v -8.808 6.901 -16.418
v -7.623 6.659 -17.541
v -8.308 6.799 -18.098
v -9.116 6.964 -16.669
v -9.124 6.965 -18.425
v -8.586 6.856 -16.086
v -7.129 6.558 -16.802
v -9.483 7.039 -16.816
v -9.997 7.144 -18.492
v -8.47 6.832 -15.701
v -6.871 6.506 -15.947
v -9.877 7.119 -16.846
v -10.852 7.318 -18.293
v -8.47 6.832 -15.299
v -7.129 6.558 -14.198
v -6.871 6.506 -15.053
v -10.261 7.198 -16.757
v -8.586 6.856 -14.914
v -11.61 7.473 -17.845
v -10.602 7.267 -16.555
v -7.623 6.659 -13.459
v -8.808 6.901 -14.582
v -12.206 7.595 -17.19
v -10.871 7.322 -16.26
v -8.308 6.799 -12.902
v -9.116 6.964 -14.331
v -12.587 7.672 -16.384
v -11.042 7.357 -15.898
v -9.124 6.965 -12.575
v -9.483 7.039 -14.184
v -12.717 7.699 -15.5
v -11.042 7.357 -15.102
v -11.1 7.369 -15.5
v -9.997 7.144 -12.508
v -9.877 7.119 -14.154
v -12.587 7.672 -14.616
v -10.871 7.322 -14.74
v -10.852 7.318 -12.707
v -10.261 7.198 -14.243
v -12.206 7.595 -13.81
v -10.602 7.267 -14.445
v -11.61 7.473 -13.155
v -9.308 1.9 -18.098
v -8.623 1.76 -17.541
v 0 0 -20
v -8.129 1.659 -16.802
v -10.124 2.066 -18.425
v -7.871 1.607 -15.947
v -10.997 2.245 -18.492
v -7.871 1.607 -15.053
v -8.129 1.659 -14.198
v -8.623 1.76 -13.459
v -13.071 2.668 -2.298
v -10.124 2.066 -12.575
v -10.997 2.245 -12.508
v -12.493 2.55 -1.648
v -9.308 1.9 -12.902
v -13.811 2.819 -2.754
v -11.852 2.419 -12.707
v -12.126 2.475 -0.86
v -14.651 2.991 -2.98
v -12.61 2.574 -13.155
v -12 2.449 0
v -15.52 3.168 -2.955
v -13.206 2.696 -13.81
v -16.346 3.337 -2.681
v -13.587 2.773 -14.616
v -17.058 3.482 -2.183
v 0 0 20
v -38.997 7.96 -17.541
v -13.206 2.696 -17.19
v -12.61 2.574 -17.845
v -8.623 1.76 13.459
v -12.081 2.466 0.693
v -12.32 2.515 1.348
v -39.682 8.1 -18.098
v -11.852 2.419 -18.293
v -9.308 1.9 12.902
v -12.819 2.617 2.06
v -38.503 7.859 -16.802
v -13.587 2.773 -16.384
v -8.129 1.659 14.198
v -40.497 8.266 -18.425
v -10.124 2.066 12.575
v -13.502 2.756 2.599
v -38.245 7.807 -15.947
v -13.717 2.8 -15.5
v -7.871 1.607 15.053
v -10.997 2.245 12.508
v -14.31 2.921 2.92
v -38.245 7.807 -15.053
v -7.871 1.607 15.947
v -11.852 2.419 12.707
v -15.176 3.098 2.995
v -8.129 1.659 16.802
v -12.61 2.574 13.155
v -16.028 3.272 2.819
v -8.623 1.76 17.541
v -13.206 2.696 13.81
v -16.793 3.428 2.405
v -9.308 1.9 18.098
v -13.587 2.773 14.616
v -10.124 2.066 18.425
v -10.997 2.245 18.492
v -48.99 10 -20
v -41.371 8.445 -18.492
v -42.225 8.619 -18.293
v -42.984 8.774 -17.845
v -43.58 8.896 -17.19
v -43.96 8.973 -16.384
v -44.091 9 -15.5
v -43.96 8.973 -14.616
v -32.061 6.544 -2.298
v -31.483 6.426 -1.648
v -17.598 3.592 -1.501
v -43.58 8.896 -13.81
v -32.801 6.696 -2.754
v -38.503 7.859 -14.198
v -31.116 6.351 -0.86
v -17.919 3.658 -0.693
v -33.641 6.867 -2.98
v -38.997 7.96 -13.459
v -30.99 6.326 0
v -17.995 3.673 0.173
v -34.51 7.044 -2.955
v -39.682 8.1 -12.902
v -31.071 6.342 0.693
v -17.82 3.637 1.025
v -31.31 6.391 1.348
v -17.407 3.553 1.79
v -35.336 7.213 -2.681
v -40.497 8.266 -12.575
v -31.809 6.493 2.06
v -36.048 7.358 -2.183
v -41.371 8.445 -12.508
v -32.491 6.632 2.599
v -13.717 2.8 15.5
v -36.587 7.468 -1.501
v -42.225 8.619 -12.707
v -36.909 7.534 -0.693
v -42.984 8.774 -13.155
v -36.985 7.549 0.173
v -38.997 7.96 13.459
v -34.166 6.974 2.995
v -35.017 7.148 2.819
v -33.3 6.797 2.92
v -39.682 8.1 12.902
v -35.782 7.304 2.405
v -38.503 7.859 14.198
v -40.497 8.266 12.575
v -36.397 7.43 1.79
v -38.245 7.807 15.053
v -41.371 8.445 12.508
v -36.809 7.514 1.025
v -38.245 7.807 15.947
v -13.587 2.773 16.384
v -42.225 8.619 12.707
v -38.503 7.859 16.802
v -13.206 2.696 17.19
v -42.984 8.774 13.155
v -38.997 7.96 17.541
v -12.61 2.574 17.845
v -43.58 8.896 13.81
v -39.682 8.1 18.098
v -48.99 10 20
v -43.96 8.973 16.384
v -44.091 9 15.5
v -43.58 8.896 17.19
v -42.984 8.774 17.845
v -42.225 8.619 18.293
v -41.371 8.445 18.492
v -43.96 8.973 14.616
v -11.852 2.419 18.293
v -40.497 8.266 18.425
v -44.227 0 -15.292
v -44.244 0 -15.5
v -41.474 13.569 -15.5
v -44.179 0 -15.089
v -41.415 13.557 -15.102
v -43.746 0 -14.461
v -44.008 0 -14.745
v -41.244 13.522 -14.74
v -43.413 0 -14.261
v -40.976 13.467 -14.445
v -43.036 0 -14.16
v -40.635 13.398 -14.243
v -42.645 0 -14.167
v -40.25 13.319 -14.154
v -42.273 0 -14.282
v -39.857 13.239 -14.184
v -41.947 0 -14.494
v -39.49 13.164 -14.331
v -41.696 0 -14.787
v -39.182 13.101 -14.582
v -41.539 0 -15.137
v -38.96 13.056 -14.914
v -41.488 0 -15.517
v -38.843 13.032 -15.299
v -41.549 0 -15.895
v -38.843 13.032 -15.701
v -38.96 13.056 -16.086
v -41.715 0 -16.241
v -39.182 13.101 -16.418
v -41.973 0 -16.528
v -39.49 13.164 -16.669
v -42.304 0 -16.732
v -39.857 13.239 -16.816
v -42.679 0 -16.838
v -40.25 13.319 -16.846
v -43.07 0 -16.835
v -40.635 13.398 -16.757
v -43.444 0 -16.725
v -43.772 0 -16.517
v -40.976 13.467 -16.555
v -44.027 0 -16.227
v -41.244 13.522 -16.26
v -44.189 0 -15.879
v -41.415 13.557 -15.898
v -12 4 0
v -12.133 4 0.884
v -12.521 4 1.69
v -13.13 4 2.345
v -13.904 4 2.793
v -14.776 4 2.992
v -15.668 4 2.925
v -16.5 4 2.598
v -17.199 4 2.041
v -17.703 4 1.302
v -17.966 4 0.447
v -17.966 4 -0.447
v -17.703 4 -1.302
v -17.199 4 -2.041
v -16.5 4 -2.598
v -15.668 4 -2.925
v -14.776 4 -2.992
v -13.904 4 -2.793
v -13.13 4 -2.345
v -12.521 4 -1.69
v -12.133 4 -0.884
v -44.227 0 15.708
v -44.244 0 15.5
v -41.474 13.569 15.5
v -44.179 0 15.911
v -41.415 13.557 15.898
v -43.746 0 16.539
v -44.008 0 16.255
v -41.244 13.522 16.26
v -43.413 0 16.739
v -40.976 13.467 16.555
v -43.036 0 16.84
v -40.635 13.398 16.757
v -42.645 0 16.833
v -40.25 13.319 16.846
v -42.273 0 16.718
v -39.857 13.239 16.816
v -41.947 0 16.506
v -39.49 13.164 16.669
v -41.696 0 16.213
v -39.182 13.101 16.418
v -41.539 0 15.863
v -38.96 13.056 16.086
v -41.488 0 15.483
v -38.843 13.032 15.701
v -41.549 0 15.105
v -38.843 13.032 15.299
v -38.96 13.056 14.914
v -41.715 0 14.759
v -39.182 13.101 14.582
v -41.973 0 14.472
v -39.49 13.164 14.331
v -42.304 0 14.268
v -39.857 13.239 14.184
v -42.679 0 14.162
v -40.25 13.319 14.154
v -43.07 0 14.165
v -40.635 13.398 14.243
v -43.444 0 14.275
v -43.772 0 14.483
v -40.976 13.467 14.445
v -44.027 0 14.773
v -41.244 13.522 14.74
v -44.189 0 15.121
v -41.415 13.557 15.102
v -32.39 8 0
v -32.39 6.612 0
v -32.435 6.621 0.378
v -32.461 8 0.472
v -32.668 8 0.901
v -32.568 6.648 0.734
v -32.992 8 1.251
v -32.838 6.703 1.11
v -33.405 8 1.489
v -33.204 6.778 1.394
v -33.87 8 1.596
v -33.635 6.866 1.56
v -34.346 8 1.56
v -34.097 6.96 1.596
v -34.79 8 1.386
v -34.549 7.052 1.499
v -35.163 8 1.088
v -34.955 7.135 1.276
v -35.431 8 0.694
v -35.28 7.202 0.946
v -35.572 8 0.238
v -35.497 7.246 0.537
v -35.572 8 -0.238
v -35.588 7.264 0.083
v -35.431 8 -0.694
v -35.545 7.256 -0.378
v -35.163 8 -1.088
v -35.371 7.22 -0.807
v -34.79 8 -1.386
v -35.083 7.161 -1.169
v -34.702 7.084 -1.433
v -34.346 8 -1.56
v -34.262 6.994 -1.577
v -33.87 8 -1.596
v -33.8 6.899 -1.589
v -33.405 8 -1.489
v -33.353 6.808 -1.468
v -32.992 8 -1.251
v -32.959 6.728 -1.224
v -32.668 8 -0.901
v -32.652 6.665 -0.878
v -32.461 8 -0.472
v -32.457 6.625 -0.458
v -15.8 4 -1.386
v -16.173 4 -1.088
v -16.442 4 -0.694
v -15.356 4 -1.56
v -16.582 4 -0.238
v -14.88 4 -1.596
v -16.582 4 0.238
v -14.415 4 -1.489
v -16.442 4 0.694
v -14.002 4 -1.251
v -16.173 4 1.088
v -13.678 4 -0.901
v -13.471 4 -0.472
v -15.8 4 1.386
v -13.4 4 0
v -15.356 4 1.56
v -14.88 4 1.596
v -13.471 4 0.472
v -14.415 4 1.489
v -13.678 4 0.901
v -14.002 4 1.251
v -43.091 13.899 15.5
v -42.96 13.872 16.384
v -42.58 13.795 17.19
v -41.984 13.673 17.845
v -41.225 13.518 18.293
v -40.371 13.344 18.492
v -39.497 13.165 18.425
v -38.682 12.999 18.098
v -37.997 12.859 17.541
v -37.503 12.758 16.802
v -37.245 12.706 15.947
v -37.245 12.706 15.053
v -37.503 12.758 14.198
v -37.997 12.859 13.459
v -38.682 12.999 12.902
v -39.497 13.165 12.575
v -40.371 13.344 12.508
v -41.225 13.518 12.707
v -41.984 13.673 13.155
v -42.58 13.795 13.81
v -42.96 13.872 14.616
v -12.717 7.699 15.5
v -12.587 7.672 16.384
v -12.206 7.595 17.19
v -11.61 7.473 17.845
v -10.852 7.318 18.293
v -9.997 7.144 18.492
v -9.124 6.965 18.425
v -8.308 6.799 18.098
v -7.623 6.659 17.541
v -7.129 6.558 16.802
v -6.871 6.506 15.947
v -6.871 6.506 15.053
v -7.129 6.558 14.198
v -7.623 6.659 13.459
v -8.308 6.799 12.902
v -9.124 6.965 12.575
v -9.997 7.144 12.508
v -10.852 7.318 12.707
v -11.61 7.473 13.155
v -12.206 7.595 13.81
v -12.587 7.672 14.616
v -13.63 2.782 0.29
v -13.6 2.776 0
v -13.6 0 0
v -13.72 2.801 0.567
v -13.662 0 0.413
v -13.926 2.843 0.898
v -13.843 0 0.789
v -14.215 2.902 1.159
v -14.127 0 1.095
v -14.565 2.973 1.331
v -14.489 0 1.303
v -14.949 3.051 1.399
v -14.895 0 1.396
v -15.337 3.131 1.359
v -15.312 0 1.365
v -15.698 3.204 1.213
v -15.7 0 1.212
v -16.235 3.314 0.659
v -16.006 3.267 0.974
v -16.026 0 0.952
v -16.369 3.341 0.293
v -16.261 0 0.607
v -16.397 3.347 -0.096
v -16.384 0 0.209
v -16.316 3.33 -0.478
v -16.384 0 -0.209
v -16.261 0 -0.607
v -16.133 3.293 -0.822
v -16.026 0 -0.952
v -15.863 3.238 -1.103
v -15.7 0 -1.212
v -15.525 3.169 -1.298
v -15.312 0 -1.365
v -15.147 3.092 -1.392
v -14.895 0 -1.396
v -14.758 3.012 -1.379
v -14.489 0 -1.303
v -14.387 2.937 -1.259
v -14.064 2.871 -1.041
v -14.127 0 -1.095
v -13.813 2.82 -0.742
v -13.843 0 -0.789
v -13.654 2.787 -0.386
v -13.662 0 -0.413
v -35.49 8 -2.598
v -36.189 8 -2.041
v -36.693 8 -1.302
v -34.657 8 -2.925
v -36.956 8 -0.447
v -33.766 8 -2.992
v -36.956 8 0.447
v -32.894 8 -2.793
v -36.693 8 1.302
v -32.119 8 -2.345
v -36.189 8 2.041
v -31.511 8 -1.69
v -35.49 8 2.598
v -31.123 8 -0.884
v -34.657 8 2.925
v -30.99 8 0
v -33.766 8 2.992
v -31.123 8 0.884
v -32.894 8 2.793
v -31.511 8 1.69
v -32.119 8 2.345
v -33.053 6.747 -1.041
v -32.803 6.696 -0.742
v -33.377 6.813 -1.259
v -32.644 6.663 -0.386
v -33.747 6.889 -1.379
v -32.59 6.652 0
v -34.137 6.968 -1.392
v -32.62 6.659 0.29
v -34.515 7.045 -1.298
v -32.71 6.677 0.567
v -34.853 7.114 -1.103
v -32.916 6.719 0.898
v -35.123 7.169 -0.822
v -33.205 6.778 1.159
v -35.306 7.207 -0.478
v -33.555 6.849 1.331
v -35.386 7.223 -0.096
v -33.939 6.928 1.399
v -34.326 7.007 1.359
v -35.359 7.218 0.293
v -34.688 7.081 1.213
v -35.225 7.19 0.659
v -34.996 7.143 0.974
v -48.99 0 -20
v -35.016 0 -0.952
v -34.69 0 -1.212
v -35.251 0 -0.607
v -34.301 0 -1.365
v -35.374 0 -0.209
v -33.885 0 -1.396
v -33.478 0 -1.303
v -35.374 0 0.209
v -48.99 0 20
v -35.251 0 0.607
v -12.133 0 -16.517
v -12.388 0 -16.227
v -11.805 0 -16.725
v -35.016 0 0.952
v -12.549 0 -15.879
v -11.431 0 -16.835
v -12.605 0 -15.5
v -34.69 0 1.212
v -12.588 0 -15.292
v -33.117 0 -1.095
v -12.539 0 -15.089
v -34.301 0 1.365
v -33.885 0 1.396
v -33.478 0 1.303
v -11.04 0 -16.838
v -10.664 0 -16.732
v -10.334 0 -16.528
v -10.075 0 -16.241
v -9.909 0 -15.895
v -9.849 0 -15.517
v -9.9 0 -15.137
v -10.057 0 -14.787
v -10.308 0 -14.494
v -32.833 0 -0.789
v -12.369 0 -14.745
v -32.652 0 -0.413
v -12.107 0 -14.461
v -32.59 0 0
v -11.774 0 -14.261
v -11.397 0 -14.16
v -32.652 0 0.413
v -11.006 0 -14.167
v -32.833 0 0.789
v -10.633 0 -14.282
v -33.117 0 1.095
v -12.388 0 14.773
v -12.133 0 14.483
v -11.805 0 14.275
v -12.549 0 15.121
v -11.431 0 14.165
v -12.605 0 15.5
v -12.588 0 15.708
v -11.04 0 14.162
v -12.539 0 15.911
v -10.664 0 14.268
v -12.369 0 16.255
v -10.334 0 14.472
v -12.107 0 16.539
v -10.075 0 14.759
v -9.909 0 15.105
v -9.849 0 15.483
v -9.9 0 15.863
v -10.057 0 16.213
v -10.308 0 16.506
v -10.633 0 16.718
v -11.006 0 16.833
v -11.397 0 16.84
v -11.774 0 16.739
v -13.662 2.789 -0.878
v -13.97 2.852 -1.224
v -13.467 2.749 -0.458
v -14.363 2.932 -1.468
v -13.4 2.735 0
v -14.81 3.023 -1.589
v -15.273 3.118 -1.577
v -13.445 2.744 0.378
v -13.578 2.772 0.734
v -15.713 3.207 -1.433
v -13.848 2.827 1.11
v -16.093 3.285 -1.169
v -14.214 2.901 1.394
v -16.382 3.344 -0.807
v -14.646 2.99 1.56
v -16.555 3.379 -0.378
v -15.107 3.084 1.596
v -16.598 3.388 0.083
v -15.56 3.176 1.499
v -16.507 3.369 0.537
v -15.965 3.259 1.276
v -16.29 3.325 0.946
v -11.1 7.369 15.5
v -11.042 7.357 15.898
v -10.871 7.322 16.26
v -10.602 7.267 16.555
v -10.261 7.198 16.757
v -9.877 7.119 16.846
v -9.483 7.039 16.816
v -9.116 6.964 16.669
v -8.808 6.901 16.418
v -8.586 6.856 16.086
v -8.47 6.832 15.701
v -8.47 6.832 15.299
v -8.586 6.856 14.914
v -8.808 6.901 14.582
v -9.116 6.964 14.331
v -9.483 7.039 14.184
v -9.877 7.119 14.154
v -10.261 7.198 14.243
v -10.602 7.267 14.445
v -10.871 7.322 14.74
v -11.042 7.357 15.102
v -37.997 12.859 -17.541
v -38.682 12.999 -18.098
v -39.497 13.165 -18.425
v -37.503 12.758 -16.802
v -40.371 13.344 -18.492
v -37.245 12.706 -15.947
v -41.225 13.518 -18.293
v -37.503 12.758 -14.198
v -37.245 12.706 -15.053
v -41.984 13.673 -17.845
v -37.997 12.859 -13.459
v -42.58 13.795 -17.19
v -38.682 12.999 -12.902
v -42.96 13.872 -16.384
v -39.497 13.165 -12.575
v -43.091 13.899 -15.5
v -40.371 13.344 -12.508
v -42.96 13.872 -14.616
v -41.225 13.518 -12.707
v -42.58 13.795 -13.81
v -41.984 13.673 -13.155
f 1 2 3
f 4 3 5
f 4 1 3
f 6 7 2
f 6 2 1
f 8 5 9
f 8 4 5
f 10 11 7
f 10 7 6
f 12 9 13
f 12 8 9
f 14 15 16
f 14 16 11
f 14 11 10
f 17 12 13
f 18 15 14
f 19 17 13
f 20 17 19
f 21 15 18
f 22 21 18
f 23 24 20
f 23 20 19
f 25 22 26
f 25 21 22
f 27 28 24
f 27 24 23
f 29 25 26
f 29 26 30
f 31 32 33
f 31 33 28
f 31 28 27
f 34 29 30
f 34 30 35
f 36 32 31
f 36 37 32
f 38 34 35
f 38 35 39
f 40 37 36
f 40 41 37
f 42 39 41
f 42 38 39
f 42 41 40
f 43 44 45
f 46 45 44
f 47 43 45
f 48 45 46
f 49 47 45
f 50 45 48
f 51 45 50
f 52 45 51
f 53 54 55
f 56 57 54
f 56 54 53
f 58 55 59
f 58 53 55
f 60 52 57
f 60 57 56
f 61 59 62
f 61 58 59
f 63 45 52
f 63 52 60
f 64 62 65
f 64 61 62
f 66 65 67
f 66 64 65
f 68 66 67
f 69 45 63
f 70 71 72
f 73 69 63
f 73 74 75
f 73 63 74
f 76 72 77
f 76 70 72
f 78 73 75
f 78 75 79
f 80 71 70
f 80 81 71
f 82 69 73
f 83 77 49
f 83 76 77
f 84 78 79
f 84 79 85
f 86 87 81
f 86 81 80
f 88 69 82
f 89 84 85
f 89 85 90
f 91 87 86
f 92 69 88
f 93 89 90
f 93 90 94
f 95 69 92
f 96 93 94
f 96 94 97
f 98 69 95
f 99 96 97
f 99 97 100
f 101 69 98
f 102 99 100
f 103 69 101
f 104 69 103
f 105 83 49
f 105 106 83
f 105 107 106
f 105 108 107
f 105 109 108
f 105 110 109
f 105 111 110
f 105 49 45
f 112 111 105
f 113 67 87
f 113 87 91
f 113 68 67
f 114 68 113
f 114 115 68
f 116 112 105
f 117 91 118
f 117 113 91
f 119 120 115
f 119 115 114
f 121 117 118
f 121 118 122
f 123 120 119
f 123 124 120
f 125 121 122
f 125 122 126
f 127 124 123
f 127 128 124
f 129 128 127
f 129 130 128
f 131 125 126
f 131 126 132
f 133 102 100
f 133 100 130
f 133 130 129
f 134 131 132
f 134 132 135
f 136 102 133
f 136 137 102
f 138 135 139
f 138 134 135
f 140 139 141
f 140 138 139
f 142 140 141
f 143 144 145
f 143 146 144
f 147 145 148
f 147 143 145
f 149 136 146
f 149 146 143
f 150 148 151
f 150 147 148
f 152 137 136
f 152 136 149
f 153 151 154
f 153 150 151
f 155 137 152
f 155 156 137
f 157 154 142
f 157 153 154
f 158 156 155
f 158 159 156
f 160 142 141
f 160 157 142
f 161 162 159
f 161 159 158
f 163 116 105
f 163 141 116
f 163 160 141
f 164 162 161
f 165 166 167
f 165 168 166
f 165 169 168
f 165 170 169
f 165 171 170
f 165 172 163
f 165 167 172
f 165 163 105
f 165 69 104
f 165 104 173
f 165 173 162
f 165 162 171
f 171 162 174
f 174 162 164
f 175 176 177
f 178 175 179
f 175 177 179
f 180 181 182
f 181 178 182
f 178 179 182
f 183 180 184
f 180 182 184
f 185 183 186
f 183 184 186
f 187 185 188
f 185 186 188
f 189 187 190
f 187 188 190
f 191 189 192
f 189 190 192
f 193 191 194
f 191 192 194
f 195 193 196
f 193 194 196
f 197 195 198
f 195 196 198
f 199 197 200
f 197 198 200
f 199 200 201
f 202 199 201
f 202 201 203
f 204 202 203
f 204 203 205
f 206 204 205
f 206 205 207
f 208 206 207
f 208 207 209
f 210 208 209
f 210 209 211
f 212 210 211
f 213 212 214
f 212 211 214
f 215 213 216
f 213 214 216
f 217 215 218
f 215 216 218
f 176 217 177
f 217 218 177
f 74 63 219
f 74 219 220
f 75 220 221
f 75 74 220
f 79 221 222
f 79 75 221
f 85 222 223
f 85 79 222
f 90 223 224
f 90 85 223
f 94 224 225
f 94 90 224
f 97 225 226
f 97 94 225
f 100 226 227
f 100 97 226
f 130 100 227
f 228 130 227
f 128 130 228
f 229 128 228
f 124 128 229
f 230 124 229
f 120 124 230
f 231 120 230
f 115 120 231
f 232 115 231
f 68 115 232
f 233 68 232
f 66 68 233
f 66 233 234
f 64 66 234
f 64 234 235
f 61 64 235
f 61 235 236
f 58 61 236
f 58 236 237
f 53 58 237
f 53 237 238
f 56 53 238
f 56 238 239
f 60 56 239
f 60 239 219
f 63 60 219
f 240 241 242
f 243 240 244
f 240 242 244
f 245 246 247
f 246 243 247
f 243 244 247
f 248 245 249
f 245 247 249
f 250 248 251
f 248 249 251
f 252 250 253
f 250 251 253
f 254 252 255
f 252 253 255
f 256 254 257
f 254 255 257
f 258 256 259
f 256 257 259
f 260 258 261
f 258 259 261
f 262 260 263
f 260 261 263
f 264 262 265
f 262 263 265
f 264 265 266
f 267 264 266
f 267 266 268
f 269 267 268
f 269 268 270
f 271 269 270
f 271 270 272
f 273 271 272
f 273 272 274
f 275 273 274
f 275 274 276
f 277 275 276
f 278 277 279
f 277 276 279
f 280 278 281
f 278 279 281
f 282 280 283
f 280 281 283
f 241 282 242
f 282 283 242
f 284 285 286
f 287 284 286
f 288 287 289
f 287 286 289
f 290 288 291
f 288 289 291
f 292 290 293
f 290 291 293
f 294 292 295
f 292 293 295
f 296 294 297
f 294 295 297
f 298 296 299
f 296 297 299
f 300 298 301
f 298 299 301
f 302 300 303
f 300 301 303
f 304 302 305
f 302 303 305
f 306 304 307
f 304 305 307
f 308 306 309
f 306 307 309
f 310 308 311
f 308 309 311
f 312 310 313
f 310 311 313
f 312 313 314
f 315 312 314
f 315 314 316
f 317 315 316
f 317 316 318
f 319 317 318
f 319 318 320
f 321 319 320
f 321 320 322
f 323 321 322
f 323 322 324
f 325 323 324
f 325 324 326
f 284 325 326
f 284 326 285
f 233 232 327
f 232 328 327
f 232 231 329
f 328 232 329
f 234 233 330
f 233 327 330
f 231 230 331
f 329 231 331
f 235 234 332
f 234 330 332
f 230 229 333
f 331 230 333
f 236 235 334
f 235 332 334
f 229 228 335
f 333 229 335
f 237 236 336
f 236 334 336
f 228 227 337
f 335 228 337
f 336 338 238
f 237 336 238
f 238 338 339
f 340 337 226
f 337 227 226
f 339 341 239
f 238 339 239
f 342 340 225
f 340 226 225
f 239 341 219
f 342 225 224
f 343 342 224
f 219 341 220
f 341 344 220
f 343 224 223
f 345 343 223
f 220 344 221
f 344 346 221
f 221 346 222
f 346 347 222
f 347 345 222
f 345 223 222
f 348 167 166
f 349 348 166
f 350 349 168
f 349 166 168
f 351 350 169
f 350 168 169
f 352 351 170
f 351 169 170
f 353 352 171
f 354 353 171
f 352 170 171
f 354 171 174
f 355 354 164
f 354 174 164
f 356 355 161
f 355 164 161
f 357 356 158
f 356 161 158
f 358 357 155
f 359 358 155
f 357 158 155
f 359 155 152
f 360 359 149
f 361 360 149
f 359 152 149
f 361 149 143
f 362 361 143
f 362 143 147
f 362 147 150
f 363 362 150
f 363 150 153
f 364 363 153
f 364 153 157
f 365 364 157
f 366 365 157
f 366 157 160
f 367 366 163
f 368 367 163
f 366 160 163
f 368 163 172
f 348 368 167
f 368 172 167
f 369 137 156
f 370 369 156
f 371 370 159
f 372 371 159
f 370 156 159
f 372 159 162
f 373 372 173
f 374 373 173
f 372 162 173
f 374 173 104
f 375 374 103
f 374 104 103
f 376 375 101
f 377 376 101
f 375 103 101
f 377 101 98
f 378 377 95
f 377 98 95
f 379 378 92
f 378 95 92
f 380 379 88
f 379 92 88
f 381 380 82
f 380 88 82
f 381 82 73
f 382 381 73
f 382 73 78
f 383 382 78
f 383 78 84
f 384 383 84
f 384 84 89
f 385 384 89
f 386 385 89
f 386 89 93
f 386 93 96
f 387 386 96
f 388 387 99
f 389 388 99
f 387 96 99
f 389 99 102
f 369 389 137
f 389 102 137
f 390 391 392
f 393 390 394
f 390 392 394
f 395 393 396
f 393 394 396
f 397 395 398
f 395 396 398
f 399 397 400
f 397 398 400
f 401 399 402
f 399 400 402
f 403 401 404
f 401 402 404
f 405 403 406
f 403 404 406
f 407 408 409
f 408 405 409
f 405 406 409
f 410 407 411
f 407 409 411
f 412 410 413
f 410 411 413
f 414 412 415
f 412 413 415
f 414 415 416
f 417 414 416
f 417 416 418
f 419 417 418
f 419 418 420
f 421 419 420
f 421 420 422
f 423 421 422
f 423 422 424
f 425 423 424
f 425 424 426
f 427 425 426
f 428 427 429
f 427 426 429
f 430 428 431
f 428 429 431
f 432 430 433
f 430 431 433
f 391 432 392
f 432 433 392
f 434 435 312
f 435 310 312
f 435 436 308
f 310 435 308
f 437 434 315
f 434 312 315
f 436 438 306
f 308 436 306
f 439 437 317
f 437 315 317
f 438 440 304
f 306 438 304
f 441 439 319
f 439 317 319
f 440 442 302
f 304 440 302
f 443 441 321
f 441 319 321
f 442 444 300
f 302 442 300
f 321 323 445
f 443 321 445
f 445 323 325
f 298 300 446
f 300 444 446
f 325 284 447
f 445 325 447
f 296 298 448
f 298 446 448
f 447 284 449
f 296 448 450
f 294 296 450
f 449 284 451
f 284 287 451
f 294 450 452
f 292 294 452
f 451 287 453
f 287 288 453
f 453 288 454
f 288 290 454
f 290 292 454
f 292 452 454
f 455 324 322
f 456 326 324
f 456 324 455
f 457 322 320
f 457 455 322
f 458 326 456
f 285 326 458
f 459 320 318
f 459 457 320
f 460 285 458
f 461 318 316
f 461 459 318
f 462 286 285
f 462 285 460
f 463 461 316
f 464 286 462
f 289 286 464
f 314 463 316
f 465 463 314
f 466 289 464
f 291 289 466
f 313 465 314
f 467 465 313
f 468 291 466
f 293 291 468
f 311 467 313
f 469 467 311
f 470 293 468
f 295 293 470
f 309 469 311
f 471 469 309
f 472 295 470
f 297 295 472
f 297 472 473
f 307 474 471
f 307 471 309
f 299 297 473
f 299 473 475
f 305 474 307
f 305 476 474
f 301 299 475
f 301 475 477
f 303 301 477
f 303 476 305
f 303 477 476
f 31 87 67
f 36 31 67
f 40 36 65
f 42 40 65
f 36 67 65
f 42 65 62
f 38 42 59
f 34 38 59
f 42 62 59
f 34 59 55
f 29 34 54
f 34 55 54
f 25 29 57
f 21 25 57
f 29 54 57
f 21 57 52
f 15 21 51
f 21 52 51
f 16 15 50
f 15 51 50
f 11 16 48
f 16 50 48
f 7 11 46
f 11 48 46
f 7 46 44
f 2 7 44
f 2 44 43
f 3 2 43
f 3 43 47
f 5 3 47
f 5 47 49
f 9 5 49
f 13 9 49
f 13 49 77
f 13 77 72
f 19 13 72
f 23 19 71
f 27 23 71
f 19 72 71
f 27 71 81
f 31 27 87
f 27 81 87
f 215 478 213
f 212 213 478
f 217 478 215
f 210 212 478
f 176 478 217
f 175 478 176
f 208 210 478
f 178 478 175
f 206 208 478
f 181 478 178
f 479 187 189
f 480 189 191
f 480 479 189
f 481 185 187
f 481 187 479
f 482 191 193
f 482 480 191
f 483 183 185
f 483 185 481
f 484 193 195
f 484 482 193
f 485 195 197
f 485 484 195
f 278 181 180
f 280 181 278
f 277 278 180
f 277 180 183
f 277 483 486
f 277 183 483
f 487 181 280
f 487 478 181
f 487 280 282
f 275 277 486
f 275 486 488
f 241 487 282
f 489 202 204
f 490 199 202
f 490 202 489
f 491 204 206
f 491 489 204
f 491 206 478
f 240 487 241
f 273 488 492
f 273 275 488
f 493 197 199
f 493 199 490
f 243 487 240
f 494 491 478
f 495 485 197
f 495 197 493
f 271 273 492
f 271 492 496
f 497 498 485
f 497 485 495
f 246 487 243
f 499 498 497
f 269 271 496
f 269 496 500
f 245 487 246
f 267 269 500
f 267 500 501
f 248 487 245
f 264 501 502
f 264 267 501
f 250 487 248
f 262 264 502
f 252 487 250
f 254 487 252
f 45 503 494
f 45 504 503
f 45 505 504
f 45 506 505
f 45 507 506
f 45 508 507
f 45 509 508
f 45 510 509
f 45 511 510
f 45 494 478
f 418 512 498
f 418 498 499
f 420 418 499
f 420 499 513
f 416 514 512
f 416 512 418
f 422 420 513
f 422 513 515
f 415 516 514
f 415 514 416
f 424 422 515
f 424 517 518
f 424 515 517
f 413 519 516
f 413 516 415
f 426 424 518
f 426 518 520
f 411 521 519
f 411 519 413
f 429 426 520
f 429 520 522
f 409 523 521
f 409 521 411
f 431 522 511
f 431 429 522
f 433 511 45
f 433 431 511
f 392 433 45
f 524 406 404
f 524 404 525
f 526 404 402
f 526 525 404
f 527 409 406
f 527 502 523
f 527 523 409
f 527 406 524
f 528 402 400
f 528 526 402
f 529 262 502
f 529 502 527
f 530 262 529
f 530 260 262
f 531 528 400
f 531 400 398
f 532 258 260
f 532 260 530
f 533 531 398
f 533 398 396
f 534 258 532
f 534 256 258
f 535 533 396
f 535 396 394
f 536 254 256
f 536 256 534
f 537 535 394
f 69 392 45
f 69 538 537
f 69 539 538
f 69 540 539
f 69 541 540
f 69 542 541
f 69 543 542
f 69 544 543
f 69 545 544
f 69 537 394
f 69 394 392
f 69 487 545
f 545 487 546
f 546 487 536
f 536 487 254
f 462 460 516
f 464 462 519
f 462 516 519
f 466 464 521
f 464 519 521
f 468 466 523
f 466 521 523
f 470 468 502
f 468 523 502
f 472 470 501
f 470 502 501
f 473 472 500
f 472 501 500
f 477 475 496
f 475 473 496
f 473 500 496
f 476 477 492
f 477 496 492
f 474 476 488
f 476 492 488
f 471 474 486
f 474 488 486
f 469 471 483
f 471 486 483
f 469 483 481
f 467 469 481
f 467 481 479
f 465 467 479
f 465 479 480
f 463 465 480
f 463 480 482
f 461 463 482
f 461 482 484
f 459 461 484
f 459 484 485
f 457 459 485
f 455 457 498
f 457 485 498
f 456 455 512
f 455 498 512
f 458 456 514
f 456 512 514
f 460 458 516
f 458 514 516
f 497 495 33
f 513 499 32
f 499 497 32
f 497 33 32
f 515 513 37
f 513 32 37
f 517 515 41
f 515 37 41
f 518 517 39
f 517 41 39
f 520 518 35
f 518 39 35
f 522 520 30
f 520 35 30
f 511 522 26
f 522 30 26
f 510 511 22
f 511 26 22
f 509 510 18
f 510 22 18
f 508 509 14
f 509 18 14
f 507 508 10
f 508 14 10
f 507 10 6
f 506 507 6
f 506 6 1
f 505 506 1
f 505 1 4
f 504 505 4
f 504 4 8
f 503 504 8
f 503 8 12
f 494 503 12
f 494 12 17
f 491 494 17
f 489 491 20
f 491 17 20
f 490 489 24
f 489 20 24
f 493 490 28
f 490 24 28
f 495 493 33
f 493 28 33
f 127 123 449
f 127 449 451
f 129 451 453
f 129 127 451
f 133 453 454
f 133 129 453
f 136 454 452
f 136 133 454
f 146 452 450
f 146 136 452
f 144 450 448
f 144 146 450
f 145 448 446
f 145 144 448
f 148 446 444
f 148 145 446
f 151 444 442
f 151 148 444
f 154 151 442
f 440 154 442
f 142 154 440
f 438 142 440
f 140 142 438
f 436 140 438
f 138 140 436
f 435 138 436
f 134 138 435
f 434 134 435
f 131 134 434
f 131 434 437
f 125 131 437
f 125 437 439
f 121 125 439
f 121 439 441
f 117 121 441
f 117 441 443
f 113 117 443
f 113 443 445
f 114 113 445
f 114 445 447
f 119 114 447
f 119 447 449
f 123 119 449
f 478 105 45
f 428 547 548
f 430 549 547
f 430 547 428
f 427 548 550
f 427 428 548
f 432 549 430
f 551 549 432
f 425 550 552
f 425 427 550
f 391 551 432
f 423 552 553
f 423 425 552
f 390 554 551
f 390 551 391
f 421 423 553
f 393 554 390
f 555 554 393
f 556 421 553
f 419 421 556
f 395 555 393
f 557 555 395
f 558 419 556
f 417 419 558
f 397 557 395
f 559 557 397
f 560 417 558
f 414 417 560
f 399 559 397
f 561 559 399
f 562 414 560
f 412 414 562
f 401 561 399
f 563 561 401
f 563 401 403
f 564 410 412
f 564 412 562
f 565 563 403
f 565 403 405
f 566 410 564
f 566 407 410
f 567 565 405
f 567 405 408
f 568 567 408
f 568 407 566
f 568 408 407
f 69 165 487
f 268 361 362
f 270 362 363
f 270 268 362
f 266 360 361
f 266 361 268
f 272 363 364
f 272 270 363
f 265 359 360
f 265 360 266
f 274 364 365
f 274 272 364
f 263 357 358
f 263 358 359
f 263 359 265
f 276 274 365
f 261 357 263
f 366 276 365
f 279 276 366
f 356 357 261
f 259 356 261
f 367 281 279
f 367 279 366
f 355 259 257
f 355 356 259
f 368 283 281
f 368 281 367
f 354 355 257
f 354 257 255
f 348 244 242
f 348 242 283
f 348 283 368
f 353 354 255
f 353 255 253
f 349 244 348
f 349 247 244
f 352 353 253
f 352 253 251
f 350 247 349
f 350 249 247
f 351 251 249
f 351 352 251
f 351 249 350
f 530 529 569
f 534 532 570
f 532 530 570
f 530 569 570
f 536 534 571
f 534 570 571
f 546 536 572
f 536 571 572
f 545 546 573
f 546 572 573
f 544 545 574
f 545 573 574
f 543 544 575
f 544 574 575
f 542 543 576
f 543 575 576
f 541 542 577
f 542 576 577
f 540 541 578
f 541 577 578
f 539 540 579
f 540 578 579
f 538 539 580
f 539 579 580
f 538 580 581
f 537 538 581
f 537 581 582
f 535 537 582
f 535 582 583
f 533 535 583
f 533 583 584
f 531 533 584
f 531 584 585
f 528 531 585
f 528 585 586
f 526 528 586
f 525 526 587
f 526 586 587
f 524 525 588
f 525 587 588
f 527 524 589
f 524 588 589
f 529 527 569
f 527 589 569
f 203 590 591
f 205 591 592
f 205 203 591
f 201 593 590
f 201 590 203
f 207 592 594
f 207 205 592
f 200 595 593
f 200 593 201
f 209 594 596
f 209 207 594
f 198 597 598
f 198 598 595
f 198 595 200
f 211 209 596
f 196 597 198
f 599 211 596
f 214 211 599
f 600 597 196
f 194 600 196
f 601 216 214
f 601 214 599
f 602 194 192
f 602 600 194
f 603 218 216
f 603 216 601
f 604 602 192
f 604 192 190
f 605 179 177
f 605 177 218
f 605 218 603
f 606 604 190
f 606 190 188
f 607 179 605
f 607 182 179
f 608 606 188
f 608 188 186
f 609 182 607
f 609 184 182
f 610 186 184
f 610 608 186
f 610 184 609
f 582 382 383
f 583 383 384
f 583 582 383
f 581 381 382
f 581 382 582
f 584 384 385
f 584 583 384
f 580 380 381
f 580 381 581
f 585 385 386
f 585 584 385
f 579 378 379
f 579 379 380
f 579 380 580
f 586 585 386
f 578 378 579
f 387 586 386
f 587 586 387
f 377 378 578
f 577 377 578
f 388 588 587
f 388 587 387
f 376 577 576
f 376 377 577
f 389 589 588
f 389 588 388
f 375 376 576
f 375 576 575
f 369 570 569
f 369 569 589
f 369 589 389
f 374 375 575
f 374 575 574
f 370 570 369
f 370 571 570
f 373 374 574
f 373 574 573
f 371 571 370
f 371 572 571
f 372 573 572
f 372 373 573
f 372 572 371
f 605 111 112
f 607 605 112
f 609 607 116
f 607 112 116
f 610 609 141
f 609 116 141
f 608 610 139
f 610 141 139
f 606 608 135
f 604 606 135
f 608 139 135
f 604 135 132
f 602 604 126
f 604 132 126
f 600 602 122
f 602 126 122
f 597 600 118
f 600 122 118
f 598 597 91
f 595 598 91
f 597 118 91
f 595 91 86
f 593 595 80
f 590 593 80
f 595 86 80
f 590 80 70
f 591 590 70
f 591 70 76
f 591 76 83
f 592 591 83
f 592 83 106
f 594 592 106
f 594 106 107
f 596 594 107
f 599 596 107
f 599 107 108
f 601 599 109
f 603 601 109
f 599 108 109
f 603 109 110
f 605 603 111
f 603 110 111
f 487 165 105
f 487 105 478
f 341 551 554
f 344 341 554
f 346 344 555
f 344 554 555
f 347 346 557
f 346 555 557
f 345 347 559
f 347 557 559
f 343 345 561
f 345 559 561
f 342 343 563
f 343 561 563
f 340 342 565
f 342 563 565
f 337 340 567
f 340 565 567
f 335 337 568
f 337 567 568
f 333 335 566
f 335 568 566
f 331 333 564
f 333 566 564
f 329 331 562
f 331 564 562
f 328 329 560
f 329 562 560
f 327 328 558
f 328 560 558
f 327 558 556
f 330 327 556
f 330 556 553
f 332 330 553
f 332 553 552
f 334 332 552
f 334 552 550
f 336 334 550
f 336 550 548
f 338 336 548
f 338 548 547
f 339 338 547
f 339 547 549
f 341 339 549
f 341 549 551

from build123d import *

# Parameters (mm, degrees)
PAD_DEPTH       = 20
SKETCH001_R     = 3
PAD001_DEPTH    = 5
SKETCH002_R     = 1.35
POCKET_DEPTH    = 14.7989589711
SKETCH003_R     = 1.4
POCKET001_DEPTH = 13.8999794856
SKETCH004_R     = 3
SKETCH004_R_2   = 1.6
PAD002_DEPTH    = 4
SKETCH005_R     = 3
SKETCH005_R_2   = 1.6
PAD003_DEPTH    = 8


with BuildPart() as part:
    # Sketch → Pad (new body, symmetric)
    with BuildSketch(Plane.XY):
        Polygon((0, 0), (-48.9897948557, 10), (-48.9897948557, 0), align=None)
    extrude(amount=PAD_DEPTH, both=True)

    # Sketch001 (on Face1 of Pad) → Pad001 (join)
    with BuildSketch(Plane(origin=(0, 0, 0), x_dir=(-0.9797958971, 0.2, 0), z_dir=(0.2, 0.9797958971, 0))):
        with Locations((42, 15.5)):
            Circle(SKETCH001_R)
        with Locations((42, -15.5)):
            Circle(SKETCH001_R)
        with Locations((11, -15.5)):
            Circle(SKETCH001_R)
        with Locations((11, 15.5)):
            Circle(SKETCH001_R)
    extrude(amount=PAD001_DEPTH)

    # Sketch002 (on Face11 of Pad001) → Pocket (cut, through all)
    with BuildSketch(Plane(origin=(1, 4.8989794856, 0), x_dir=(-0.9797958971, 0.2, 0), z_dir=(0.2, 0.9797958971, 0))):
        with Locations((42, -15.5)):
            Circle(SKETCH002_R)
        with Locations((11, -15.5)):
            Circle(SKETCH002_R)
        with Locations((42, 15.5)):
            Circle(SKETCH002_R)
        with Locations((11, 15.5)):
            Circle(SKETCH002_R)
    extrude(amount=-POCKET_DEPTH, mode=Mode.SUBTRACT)

    # Sketch003 (on Face2 of Pocket) → Pocket001 (cut, through all)
    with BuildSketch(Plane.XZ):
        with Locations((-15, 0)):
            Circle(SKETCH003_R)
        with Locations((-33.9897948557, 0)):
            Circle(SKETCH003_R)
    extrude(amount=-POCKET001_DEPTH, mode=Mode.SUBTRACT)

    # Sketch004 (on Face2 of Pocket001) → Pad002 (join)
    with BuildSketch(Plane.XZ):
        with Locations((-15, 0)):
            Circle(SKETCH004_R)
        with Locations((-15, 0)):
            Circle(SKETCH004_R_2, mode=Mode.SUBTRACT)
    extrude(amount=-PAD002_DEPTH)

    # Sketch005 (on Face2 of Pad002) → Pad003 (join)
    with BuildSketch(Plane.XZ):
        with Locations((-33.9897948557, 0)):
            Circle(SKETCH005_R)
        with Locations((-33.9897948557, 0)):
            Circle(SKETCH005_R_2, mode=Mode.SUBTRACT)
    extrude(amount=-PAD003_DEPTH)


solid = part.part
